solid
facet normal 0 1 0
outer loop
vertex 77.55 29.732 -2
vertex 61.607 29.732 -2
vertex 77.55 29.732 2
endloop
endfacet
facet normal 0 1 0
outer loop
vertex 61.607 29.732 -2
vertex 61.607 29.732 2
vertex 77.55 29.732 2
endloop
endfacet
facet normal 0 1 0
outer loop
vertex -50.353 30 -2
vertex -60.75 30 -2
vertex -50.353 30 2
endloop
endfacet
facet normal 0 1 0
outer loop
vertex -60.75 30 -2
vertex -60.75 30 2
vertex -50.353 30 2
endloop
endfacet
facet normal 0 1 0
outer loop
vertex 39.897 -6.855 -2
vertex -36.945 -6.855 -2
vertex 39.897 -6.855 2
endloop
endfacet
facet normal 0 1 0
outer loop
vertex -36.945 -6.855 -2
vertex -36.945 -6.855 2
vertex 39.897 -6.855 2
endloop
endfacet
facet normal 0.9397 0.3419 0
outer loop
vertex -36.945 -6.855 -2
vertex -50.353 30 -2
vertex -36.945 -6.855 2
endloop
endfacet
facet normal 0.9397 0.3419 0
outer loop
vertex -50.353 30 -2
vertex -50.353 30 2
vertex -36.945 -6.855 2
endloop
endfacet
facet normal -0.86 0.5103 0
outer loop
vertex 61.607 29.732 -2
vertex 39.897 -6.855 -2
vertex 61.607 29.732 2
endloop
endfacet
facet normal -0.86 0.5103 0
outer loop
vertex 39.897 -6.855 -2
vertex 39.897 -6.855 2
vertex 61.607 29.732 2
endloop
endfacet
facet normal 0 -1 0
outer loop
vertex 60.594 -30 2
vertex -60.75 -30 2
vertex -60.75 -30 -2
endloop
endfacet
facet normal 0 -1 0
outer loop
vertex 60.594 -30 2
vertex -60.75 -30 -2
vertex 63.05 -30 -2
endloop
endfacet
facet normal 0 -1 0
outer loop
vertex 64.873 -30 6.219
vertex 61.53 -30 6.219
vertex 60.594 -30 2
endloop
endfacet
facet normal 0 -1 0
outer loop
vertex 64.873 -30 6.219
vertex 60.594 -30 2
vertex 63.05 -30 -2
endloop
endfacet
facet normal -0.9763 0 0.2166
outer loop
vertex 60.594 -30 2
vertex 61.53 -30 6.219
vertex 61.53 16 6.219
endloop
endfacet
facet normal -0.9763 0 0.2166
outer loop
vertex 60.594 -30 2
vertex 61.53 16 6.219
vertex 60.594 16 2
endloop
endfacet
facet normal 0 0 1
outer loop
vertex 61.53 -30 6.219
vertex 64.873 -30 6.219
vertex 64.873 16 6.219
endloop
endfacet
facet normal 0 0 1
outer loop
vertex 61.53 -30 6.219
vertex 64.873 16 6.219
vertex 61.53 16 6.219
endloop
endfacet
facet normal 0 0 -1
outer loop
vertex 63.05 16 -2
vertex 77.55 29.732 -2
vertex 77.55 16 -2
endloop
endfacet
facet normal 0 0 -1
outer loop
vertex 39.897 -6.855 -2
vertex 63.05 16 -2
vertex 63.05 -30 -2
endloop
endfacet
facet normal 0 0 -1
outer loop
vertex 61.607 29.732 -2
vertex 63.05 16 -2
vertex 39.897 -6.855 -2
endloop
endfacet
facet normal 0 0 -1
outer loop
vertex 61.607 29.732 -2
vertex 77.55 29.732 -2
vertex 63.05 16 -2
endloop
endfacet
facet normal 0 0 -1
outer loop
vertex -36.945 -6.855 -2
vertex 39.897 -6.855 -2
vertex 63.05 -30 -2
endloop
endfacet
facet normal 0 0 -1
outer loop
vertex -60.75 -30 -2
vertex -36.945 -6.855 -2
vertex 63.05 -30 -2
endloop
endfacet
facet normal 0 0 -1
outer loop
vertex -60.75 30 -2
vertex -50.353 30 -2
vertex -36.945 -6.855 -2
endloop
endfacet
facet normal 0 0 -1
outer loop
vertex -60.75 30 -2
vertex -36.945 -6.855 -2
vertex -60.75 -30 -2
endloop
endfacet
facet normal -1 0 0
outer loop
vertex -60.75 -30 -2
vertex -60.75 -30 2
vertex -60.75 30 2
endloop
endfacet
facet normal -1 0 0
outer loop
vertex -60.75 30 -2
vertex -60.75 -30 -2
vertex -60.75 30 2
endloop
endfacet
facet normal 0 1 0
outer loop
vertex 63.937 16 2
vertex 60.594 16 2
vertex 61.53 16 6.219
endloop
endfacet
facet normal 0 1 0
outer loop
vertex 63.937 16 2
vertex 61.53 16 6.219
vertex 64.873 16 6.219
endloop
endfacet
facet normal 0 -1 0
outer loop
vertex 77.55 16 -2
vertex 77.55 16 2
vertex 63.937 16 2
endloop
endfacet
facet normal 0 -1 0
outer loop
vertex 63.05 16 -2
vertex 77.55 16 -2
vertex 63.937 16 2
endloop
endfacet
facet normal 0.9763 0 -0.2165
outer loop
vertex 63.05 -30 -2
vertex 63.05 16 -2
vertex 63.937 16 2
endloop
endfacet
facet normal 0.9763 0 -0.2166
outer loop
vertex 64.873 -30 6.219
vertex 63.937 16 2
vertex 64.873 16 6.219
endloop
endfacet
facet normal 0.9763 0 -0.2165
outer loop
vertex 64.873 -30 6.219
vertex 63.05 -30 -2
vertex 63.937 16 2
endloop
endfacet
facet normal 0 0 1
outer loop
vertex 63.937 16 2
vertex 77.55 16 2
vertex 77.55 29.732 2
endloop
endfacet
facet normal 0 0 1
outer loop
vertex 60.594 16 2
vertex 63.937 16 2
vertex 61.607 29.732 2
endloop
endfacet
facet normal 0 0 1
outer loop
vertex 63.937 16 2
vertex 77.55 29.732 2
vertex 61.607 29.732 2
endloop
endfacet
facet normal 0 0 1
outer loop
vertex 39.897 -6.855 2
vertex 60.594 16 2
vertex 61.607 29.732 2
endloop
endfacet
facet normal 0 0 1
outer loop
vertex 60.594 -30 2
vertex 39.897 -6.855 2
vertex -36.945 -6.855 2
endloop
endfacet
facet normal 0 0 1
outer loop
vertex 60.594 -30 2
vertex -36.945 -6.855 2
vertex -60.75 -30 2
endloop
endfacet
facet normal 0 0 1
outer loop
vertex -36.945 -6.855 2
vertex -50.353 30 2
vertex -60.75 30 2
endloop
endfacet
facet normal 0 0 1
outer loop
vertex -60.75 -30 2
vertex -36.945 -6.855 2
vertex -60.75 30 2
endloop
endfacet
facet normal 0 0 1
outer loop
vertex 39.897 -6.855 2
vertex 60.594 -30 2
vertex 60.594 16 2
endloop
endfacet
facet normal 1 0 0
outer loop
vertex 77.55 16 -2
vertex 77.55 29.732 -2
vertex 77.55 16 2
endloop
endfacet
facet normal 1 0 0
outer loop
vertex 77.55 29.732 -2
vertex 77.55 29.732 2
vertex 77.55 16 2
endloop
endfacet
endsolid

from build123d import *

# Parameters (mm, degrees)
BOSS_EXTRUDE1_DEPTH = 2
BOSS_EXTRUDE2_DEPTH = 46


with BuildPart() as part:
    # Sketch1 → Boss-Extrude1 (new, symmetric)
    with BuildSketch(Plane.XY):
        Polygon((-60.75, -30), (-60.75, 30), (-50.352877454, 30), (-36.945370579, -6.855179418), (39.897088693, -6.855179418), (61.606830496, 29.73214036), (77.549740604, 29.73214036), (77.549740604, 16), (63.049740604, 16), (63.049740604, -30), align=None)
    extrude(amount=BOSS_EXTRUDE1_DEPTH, both=True)

    # Sketch2 → Boss-Extrude2 (add)
    with BuildSketch(Plane.XZ.offset(30)):
        Polygon((63.049740604, -2), (64.873027277, 6.219294114), (61.530350142, 6.219294114), (60.59438379, 2), align=None)
    extrude(amount=-BOSS_EXTRUDE2_DEPTH)


solid = part.part
